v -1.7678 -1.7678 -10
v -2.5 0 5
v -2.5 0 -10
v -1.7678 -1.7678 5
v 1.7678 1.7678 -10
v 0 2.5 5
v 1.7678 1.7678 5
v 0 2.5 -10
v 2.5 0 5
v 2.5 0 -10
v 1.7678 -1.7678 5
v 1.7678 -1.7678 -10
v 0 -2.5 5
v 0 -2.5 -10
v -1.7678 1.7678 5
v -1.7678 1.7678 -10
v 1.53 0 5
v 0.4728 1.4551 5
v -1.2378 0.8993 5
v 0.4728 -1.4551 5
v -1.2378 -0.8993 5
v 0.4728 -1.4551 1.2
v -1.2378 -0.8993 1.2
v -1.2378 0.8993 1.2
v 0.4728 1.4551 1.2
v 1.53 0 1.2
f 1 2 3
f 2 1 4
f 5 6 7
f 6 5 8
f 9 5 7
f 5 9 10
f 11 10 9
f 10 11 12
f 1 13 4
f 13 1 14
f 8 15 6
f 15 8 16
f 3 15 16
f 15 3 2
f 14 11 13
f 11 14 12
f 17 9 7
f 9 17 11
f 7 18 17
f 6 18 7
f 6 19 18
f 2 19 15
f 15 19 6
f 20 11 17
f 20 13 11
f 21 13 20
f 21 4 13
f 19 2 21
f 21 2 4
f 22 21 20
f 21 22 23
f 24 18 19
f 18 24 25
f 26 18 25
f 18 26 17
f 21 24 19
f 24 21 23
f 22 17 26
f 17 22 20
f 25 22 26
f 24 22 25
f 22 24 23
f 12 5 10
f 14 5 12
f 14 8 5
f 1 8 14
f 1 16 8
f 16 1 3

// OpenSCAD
// Parameters
length_mm = 10; //[5:30:1]
threaded_length_mm = 10; //[5:30:1]
thread_major_d_mm = 5; //[3:10:0.1]
thread_pitch_mm = 0.8; //[0.5:1.5:0.05]
socket_af_mm = 2.5; //[1.5:4:0.1]
socket_depth_mm = 3; //[1.5:6:0.1]
overlap_mm = 0.8; //[0.5:2:0.1]
clearance_mm = 0.15; //[0.05:0.4:0.05]

// Screw - complete geometry
module screw() {
  color("DimGray") {
    // Grub screw body with internal hex socket
    difference() {
      cylinder(r=thread_major_d_mm/2, h=length_mm, center=true);
      translate([0, 0, length_mm/2 - socket_depth_mm/2])
        cylinder(r=(socket_af_mm + clearance_mm) / cos(30) / 2, h=socket_depth_mm + 2 * overlap_mm, center=true);
    }
    // Threaded shaft (cylindrical approximation)
    translate([0, 0, -length_mm/2])
      cylinder(r=thread_major_d_mm/2, h=threaded_length_mm, center=true);
  }
}

// Assembly
module assembly() {
  screw();
}

assembly();
